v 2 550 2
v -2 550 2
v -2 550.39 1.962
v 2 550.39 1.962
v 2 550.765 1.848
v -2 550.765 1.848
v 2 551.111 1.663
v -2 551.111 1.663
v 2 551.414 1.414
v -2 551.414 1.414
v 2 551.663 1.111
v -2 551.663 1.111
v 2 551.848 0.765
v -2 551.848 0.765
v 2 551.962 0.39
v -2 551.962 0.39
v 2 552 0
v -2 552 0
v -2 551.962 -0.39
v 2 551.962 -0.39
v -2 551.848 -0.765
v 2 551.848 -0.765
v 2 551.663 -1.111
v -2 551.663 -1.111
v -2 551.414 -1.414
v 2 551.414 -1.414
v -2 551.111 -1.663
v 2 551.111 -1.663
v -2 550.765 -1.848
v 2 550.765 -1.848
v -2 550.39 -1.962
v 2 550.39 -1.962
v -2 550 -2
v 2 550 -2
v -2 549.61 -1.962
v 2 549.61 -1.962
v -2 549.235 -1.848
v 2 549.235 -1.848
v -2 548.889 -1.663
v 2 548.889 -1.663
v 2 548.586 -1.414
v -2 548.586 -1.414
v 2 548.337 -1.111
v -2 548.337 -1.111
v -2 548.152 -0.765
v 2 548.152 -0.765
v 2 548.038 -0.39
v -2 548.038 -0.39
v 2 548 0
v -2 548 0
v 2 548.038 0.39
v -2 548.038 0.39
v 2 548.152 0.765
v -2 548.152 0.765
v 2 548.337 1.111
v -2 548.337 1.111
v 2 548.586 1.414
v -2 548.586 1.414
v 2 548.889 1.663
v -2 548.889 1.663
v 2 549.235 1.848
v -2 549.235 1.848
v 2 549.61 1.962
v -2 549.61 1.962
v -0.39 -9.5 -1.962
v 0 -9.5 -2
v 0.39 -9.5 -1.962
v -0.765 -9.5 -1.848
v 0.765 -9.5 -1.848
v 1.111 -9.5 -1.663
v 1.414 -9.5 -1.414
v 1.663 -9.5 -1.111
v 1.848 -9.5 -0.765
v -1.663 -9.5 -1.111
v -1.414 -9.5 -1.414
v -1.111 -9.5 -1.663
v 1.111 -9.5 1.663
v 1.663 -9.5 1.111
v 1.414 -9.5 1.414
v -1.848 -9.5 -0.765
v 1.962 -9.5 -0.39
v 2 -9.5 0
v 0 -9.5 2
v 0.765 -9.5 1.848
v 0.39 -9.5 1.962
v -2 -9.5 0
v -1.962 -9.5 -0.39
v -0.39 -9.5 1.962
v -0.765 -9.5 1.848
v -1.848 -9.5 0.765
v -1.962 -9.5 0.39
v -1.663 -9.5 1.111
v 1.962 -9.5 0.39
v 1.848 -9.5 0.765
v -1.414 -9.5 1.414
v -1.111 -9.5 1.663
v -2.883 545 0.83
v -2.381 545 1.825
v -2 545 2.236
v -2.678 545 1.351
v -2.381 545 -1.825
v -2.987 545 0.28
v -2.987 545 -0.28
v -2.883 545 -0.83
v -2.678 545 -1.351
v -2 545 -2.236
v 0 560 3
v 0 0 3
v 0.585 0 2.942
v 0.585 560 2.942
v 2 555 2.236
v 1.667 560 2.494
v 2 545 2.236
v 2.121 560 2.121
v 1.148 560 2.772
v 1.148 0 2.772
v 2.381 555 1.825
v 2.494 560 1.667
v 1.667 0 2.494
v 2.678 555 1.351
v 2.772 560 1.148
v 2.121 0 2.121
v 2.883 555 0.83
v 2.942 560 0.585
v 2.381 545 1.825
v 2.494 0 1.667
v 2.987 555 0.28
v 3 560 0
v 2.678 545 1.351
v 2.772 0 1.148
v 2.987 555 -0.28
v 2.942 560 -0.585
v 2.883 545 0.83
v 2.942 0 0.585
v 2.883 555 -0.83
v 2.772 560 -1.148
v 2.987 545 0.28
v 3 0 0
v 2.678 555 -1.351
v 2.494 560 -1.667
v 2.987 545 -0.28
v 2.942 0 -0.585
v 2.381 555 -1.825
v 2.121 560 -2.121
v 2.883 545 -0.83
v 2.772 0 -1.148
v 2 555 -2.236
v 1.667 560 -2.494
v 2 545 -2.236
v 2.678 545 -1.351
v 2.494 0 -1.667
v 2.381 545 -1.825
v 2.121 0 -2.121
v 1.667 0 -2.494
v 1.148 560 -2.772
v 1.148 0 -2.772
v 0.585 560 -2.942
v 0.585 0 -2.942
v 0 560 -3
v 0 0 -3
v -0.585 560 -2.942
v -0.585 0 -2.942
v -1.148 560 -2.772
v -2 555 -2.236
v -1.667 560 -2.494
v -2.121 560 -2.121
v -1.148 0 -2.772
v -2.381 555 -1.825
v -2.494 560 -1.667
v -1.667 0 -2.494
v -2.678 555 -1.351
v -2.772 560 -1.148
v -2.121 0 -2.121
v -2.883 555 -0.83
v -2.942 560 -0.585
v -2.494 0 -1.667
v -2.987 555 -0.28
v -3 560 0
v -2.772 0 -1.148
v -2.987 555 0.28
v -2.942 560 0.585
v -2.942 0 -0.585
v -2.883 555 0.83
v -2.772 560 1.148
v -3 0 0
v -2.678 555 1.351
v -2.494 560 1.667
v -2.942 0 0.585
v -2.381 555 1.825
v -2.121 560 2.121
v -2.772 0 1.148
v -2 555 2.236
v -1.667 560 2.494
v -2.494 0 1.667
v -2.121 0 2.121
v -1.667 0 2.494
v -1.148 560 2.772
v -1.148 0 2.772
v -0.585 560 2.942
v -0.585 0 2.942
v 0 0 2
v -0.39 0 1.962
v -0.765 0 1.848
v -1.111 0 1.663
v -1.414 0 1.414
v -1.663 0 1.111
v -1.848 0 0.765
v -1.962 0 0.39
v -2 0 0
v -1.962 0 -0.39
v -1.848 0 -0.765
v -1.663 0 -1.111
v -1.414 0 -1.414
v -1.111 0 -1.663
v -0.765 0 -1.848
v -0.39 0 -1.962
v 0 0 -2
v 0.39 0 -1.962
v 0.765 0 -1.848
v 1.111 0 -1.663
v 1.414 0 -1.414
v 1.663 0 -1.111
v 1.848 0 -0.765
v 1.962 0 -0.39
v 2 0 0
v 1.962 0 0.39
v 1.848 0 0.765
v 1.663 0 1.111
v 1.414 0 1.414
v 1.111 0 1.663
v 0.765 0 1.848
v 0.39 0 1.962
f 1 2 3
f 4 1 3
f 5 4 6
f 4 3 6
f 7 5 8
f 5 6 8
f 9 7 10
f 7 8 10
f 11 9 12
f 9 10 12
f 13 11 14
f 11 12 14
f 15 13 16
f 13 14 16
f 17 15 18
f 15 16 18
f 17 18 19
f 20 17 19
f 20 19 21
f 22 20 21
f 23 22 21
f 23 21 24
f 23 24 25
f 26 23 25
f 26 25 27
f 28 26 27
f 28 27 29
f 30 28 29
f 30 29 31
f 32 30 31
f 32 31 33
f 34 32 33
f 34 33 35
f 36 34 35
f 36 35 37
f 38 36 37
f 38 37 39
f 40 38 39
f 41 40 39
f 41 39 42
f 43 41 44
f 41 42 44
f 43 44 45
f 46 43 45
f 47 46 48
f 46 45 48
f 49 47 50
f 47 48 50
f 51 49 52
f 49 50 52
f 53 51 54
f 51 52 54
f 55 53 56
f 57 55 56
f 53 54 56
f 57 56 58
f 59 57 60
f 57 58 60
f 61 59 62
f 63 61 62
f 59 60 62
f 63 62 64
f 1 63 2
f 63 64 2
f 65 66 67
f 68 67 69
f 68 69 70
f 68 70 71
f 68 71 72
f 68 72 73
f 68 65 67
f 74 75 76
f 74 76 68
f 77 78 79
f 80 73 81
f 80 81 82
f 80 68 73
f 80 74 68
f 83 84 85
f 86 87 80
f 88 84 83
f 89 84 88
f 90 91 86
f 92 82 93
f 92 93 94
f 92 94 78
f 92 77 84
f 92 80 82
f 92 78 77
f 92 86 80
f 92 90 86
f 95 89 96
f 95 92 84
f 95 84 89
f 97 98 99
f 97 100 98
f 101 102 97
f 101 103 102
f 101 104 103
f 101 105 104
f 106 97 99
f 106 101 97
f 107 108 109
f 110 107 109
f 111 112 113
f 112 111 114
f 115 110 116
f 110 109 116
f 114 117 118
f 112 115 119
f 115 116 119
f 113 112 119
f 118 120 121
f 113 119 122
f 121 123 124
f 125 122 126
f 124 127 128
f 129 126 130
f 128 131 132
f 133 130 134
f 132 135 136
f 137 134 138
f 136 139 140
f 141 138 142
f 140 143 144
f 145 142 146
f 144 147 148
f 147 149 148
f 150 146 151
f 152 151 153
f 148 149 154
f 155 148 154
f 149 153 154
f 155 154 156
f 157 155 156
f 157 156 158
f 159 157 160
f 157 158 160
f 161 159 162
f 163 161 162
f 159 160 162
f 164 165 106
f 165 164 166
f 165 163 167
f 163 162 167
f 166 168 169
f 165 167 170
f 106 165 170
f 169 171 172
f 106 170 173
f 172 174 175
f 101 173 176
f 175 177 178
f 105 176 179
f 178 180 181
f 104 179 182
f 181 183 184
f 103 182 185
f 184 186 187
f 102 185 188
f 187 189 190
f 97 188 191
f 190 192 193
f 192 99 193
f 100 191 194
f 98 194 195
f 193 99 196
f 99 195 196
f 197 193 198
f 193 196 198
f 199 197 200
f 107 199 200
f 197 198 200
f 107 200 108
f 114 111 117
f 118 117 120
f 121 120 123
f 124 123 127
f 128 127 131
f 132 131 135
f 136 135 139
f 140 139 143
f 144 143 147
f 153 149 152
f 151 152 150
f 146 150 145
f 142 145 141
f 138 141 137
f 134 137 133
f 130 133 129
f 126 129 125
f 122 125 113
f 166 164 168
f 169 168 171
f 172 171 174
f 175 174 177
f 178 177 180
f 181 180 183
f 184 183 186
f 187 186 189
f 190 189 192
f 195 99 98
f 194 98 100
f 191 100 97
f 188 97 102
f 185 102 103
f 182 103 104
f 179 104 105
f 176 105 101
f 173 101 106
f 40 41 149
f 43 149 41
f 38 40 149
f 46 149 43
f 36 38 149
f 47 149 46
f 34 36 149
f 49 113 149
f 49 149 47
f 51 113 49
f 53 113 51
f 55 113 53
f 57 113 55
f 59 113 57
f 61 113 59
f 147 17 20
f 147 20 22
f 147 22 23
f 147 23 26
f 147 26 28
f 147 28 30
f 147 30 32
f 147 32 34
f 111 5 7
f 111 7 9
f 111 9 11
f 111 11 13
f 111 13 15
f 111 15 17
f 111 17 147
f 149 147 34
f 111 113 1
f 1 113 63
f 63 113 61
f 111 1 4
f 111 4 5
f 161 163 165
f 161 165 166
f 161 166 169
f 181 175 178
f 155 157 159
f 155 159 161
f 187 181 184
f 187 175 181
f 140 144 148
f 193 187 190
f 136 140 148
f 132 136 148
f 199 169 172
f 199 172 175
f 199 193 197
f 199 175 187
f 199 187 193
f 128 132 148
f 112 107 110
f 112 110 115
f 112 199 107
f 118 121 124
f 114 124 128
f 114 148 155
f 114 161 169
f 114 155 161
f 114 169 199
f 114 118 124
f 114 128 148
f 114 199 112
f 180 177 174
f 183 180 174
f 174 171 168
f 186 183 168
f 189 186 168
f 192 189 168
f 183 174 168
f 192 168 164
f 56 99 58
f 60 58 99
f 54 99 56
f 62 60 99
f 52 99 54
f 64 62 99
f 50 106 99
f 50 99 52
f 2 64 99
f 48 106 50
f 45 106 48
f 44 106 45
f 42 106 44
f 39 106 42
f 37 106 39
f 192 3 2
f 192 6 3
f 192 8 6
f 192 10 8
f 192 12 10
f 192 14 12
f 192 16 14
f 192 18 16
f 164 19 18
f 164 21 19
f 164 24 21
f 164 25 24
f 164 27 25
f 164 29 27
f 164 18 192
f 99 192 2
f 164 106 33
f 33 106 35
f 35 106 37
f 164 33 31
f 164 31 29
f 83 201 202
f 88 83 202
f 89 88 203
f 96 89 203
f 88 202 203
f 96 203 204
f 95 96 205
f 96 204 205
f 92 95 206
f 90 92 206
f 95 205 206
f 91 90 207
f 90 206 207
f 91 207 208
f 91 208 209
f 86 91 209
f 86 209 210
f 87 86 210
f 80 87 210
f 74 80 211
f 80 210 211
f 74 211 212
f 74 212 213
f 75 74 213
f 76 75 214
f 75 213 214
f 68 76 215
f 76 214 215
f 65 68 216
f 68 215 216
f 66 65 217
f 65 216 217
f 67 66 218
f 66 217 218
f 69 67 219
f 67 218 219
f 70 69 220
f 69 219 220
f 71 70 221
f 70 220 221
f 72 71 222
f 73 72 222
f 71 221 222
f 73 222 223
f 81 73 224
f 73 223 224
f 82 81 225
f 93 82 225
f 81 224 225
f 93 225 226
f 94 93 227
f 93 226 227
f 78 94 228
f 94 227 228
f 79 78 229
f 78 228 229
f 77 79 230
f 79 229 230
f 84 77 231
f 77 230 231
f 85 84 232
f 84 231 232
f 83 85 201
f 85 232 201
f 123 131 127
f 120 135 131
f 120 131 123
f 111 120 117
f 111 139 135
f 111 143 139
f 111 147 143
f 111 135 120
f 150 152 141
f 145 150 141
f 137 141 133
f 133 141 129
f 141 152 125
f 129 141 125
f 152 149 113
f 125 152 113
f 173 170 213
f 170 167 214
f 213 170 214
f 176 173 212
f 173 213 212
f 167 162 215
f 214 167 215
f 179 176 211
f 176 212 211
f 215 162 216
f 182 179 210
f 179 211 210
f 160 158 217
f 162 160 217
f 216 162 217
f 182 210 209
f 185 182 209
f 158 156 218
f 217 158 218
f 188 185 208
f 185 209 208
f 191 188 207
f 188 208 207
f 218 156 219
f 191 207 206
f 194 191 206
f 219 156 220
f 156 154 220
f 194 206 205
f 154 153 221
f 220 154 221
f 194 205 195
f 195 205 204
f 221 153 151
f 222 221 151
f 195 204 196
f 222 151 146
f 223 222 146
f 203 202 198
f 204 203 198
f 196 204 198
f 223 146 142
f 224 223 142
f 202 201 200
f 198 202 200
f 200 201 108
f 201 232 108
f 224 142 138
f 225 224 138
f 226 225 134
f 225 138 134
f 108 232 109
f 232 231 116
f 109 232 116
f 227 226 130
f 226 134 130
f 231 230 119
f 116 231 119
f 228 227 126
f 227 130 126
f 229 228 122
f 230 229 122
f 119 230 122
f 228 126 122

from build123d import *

# Parameters (mm, degrees)
SKETCH_2_R          = 3
EXTRUDE_1_DEPTH     = 540
SKETCH_3_R          = 2
EXTRUDE_2_DEPTH     = 9.5
SKETCH_4_R          = 3
EXTRUDE_3_DEPTH     = 20
SKETCH_6_W          = 1
SKETCH_6_H          = 10
CUT_EXTRUDE_2_DEPTH = 5
SKETCH_7_R          = 2
CUT_EXTRUDE_3_DEPTH = 10


with BuildPart() as part:
    # 草图2 → 凸台-拉伸1 (new body)
    with BuildSketch(Plane(origin=(0, 0, 0), x_dir=(1, 0, 0), z_dir=(0, 1, 0))):
        with Locations(Location((0, 0, 0), (0, 0, 270))):
            Circle(SKETCH_2_R)
    extrude(amount=EXTRUDE_1_DEPTH)

    # 草图3 → 凸台-拉伸2 (add)
    with BuildSketch(Plane.XZ):
        with Locations(Location((0, 0, 0), (0, 0, 90))):
            Circle(SKETCH_3_R)
    extrude(amount=EXTRUDE_2_DEPTH)

    # 草图4 → 凸台-拉伸3 (add)
    with BuildSketch(Plane(origin=(0, 540, 0), x_dir=(1, 0, 0), z_dir=(0, 1, 0))):
        with Locations(Location((0, 0, 0), (0, 0, 270))):
            Circle(SKETCH_4_R)
    extrude(amount=EXTRUDE_3_DEPTH)

    # 草图6 → 切除-拉伸2 (cut, symmetric)
    with BuildSketch(Plane.XY):
        with Locations((-2.5, 550)):
            Rectangle(SKETCH_6_W, SKETCH_6_H)
        with Locations((2.5, 550)):
            Rectangle(SKETCH_6_W, SKETCH_6_H)
    extrude(amount=CUT_EXTRUDE_2_DEPTH, both=True, mode=Mode.SUBTRACT)

    # 草图7 → 切除-拉伸3 (cut)
    with BuildSketch(Plane.ZY.offset(2)):
        with Locations((0, 550)):
            Circle(SKETCH_7_R)
    extrude(amount=-CUT_EXTRUDE_3_DEPTH, mode=Mode.SUBTRACT)


solid = part.part
